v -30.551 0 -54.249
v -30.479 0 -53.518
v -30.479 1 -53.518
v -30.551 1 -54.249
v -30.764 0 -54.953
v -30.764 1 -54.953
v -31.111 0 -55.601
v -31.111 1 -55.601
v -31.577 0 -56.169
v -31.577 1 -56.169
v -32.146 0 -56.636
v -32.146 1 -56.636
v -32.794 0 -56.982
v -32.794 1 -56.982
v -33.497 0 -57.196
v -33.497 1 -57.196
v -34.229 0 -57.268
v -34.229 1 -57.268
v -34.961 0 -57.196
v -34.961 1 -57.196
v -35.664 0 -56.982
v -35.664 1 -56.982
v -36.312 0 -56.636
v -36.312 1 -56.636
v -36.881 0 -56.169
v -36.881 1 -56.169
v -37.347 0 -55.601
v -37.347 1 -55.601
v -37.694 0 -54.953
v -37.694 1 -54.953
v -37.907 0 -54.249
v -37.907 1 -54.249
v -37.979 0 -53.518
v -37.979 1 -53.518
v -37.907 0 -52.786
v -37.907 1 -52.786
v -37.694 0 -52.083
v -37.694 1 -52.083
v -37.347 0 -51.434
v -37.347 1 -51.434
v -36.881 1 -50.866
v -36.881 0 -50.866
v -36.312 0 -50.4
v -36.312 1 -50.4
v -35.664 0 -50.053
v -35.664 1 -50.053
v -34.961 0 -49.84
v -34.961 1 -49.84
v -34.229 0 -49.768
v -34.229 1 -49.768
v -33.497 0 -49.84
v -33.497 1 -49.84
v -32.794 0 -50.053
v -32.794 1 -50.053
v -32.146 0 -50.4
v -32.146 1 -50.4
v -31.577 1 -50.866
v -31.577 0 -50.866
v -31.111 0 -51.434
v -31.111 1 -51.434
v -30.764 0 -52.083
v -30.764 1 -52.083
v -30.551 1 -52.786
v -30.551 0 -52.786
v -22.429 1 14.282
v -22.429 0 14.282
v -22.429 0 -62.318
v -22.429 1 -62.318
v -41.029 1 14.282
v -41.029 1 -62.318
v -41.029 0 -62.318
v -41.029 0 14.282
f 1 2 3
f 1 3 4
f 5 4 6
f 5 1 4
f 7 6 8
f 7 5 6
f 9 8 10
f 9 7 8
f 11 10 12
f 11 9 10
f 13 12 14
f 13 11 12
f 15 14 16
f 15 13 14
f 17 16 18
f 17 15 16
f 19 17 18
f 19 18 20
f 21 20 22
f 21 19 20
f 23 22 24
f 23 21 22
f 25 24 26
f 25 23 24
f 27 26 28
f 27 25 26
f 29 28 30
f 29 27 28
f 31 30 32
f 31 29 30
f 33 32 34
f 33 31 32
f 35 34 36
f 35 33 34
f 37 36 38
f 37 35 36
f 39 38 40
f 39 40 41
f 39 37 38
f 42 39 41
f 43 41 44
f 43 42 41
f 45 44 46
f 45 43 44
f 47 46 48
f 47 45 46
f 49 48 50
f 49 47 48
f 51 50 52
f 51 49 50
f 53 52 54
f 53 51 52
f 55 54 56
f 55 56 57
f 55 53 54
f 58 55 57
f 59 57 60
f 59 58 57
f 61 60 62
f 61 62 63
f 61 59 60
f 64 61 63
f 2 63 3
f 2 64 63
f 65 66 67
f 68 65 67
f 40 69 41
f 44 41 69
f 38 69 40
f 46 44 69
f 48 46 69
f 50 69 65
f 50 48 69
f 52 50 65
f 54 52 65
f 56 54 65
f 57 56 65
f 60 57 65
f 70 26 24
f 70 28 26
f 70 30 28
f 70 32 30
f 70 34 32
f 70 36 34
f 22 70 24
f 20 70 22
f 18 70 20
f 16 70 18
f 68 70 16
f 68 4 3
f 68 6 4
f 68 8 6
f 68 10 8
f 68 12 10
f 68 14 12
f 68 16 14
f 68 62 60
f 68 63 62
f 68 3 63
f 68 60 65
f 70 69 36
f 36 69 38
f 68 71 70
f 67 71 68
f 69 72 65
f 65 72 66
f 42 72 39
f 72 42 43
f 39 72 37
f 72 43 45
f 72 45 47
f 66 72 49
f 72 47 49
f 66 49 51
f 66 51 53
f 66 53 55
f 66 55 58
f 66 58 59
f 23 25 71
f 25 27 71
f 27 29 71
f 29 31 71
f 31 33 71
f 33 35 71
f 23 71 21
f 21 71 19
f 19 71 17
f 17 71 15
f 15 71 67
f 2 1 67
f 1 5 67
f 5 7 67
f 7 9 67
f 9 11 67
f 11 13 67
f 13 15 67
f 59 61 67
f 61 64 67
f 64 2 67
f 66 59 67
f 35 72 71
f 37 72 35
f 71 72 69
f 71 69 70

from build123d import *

# Parameters (mm, degrees)
SKETCH2_W           = 18.6
SKETCH2_H           = 76.6
SKETCH2_R           = 3.75
BOSS_EXTRUDE1_DEPTH = 1


with BuildPart() as part:
    # Sketch2 → Boss-Extrude1 (new body)
    with BuildSketch(Plane(origin=(0, 0, 0), x_dir=(1, 0, 0), z_dir=(0, 1, 0))):
        with Locations((-31.729014151, 24.017653569)):
            Rectangle(SKETCH2_W, SKETCH2_H)
        with Locations((-34.229014151, 53.517653569)):
            Circle(SKETCH2_R, mode=Mode.SUBTRACT)
    extrude(amount=BOSS_EXTRUDE1_DEPTH)


solid = part.part
